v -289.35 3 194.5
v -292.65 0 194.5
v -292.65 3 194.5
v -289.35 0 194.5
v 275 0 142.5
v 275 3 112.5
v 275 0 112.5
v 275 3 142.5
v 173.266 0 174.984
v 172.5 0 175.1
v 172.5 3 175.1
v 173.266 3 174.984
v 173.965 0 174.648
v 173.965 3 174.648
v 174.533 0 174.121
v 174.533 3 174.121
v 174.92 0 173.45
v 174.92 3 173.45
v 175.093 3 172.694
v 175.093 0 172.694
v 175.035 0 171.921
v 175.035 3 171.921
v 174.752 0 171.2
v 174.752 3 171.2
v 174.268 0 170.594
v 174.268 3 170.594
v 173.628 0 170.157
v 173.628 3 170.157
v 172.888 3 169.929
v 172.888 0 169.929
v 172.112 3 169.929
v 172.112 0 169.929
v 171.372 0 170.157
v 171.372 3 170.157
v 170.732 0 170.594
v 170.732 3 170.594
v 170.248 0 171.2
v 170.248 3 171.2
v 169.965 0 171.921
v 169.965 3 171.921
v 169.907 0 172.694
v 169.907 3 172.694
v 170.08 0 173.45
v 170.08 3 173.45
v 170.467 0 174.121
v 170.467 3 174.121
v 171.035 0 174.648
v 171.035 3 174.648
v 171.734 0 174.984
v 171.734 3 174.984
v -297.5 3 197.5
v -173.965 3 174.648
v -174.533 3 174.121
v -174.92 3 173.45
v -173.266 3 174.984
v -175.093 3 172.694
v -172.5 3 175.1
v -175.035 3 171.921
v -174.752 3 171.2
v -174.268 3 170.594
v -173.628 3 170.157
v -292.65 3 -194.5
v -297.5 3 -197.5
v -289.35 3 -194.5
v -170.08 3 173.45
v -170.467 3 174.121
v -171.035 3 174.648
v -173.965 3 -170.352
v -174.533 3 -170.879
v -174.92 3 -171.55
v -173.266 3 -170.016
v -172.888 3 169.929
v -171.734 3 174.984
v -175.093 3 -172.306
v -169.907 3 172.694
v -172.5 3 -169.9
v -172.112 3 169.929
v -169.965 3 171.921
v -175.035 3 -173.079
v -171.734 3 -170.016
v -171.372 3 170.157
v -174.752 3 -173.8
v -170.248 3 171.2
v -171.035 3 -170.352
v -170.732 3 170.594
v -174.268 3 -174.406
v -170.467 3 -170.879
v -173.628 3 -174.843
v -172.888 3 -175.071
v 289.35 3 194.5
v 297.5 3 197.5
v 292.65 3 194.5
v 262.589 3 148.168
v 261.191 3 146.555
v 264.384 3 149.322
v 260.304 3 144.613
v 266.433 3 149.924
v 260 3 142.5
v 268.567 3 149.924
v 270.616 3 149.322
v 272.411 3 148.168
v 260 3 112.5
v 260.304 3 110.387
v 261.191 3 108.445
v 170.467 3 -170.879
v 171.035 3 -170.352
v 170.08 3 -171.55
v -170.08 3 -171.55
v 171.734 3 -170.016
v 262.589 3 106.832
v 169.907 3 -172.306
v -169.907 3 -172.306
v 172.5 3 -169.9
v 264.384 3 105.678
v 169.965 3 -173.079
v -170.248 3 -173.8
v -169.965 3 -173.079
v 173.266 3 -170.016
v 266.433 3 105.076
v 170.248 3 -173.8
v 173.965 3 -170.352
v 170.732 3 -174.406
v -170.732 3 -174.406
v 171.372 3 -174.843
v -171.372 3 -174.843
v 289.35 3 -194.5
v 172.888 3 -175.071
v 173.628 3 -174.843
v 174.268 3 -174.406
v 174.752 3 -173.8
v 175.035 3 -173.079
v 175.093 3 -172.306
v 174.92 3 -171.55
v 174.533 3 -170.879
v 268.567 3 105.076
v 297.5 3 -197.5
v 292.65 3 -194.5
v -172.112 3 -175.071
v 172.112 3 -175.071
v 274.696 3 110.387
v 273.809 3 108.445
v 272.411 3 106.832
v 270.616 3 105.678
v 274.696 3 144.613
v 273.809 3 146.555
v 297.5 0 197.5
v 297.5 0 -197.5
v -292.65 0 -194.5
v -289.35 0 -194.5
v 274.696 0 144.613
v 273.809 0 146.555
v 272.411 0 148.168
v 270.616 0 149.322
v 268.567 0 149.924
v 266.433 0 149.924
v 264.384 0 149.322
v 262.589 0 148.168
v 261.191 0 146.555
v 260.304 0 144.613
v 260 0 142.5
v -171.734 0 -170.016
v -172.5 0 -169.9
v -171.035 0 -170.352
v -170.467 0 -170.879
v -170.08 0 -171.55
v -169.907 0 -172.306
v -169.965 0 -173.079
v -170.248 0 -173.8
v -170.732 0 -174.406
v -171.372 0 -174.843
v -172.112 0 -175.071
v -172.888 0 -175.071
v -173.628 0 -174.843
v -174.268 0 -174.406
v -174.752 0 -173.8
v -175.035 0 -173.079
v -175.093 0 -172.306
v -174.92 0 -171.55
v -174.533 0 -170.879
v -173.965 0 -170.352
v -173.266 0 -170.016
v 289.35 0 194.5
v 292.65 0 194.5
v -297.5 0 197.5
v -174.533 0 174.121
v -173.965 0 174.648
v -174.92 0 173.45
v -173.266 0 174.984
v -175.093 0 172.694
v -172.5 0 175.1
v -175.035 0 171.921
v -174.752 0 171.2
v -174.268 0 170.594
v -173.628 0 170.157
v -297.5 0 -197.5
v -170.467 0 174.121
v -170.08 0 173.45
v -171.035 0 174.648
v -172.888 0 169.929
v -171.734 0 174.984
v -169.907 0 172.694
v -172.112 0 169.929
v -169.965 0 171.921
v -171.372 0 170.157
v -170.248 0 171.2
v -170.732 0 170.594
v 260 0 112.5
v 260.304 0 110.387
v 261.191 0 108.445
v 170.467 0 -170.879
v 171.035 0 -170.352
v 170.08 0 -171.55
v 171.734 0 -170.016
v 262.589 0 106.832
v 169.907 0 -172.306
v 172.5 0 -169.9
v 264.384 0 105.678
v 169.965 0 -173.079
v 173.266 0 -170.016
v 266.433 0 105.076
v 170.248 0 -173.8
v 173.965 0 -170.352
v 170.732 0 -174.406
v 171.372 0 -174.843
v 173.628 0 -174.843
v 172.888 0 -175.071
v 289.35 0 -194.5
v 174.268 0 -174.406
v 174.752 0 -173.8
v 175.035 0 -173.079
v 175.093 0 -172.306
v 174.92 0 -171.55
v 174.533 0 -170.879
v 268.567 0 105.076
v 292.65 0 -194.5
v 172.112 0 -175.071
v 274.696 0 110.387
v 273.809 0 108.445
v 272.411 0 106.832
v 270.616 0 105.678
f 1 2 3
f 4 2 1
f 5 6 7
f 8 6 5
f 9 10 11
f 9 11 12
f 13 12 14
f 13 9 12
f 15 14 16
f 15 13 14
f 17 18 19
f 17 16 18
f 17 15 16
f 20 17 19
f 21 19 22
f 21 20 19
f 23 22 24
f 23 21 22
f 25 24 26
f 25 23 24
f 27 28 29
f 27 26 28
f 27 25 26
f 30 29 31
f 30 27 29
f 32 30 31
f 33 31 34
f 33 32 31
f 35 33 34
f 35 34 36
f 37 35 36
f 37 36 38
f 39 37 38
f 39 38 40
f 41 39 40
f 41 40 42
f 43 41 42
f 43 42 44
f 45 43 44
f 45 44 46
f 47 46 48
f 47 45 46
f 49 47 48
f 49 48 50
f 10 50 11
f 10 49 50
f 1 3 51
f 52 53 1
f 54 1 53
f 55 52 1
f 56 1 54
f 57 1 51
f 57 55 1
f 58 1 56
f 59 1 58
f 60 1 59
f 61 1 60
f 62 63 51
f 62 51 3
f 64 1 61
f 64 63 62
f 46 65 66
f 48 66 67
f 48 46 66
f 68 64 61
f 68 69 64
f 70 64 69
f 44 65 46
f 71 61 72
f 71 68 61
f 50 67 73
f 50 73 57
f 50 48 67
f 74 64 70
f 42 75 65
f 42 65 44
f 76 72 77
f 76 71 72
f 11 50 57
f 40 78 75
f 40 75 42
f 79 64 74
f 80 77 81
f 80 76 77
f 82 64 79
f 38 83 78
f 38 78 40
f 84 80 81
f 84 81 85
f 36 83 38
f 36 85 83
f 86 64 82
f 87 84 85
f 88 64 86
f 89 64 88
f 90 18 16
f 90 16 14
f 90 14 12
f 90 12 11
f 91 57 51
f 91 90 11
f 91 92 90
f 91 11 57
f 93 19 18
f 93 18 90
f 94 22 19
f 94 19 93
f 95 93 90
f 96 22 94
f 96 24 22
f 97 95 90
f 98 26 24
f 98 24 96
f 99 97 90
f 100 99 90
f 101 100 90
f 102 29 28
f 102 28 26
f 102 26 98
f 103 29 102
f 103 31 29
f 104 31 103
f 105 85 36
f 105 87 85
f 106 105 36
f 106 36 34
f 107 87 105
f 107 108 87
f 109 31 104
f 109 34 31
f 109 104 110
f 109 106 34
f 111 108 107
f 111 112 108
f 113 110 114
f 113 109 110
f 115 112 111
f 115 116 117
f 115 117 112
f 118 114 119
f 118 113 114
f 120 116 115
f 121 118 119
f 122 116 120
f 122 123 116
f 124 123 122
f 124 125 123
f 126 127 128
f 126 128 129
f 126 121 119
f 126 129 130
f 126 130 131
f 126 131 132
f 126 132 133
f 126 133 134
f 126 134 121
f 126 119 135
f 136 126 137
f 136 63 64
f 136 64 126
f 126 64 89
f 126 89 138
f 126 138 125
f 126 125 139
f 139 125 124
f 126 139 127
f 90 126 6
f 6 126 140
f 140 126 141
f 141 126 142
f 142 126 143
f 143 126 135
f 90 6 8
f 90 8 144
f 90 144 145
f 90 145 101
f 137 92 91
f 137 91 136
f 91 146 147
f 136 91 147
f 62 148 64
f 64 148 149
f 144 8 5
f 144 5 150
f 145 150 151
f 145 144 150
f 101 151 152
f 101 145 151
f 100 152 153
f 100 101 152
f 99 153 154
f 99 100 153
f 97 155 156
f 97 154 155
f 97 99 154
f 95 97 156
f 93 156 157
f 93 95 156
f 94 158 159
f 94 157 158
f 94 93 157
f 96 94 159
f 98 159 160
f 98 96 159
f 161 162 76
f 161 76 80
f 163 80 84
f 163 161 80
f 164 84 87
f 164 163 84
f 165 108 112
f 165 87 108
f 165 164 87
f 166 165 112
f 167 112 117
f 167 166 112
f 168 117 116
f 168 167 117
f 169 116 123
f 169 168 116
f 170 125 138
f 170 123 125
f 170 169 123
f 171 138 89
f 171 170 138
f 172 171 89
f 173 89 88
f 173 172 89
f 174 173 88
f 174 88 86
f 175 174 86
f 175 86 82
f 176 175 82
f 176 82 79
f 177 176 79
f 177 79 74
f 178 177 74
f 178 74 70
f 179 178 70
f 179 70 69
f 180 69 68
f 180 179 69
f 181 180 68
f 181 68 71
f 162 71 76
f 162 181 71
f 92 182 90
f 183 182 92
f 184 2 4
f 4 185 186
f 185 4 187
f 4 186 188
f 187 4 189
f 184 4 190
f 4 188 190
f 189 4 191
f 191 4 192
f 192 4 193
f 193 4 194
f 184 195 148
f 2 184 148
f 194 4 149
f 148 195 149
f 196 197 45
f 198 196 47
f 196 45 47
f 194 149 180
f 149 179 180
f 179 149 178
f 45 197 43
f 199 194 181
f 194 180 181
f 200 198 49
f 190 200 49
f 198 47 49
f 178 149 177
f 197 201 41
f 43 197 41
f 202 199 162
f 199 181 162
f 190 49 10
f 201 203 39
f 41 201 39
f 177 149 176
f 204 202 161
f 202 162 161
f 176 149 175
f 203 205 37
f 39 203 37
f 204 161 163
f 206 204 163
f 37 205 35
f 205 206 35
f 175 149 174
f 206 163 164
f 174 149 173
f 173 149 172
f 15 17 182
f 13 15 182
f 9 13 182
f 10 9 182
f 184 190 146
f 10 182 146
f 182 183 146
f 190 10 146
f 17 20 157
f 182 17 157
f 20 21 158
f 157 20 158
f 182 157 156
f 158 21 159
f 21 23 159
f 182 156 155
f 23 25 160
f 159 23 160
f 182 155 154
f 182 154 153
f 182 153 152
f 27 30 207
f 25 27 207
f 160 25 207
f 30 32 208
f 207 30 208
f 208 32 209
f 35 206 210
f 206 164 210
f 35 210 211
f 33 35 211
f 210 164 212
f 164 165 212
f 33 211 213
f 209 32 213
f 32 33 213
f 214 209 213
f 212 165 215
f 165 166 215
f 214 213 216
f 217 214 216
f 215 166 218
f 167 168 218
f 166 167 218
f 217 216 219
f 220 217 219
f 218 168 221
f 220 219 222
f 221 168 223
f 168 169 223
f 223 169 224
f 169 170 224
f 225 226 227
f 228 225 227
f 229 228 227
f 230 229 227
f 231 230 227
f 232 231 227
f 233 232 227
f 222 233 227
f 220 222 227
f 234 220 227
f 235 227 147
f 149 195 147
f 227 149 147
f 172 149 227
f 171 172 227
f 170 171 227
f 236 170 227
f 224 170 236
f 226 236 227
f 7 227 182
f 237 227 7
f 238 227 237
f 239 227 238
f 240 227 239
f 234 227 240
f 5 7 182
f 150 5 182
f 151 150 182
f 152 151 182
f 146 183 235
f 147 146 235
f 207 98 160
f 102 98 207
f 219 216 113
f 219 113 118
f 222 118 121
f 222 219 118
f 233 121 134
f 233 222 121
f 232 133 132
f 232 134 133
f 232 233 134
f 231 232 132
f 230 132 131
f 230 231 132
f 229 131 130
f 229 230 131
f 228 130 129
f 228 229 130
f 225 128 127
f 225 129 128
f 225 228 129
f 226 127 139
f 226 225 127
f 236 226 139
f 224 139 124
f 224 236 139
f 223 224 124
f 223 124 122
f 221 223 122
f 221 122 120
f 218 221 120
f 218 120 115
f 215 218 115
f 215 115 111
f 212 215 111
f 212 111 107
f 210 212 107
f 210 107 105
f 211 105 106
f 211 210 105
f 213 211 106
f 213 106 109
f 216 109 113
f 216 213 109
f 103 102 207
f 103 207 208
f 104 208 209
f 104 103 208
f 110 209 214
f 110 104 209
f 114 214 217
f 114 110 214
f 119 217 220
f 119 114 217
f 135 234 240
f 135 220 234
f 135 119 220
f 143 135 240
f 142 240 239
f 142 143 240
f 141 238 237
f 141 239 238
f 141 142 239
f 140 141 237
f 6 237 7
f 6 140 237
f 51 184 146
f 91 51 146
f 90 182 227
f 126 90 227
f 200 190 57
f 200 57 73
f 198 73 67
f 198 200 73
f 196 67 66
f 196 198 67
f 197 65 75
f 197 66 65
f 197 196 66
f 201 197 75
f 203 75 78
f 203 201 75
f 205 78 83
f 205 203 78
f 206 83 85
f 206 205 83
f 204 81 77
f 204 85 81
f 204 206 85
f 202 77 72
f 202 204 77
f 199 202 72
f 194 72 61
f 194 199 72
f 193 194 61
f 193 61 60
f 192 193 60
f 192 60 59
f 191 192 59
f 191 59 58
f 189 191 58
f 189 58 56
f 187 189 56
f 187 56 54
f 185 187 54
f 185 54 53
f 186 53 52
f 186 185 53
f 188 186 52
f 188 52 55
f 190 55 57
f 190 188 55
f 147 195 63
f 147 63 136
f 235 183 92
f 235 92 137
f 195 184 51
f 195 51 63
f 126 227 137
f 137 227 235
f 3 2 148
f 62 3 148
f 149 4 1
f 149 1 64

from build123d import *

# Parameters (mm, degrees)
SKETCH1_W               = 595
SKETCH1_H               = 395
BOSS_EXTRUDE1_DEPTH     = 3
CUT_EXTRUDE1_DEPTH      = 10
CUT_EXTRUDE2_DEPTH      = 358.10152618
CUT_EXTRUDE2_DEPTH_BACK = 358.10152618
SKETCH5_W               = 3.3
SKETCH5_H               = 389
CUT_EXTRUDE3_DEPTH      = 358.10152618
CUT_EXTRUDE3_DEPTH_BACK = 358.10152618
SKETCH6_R               = 2.6


with BuildPart() as part:
    # Sketch1 → Boss-Extrude1 (new body)
    with BuildSketch(Plane(origin=(0, 0, 0), x_dir=(1, 0, 0), z_dir=(0, 1, 0))):
        Rectangle(SKETCH1_W, SKETCH1_H)
    extrude(amount=BOSS_EXTRUDE1_DEPTH)

    # Sketch2 → Cut-Extrude1 (cut)
    with BuildSketch(Plane(origin=(0, 3, 0), x_dir=(1, 0, 0), z_dir=(0, 1, 0))):
        with BuildLine():
            Line((275, -112.5), (275, -142.5))
            ThreePointArc((275, -142.5), (267.5, -150), (260, -142.5))
            Line((260, -142.5), (260, -112.5))
            ThreePointArc((260, -112.5), (267.5, -105), (275, -112.5))
        make_face()
    extrude(amount=-CUT_EXTRUDE1_DEPTH, mode=Mode.SUBTRACT)

    # Sketch5 → Cut-Extrude2 (cut, two sides: drawn at the far end of the back side and taken through both)
    with BuildSketch(Plane(origin=(0, 3, 0), x_dir=(1, 0, 0), z_dir=(0, 1, 0)).offset(-CUT_EXTRUDE2_DEPTH_BACK)):
        with Locations((-291, 0)):
            Rectangle(SKETCH5_W, SKETCH5_H)
        with Locations((291, 0)):
            Rectangle(SKETCH5_W, SKETCH5_H)
    extrude(amount=CUT_EXTRUDE2_DEPTH + CUT_EXTRUDE2_DEPTH_BACK, mode=Mode.SUBTRACT)

    # Sketch6 → Cut-Extrude3 (cut, two sides: drawn at the far end of the back side and taken through both)
    with BuildSketch(Plane(origin=(0, 3, 0), x_dir=(1, 0, 0), z_dir=(0, 1, 0)).offset(-CUT_EXTRUDE3_DEPTH_BACK)):
        with Locations(Location((172.5, 172.5, 0), (0, 0, 270))):
            Circle(SKETCH6_R)
        with Locations(Location((-172.5, -172.5, 0), (0, 0, 270))):
            Circle(SKETCH6_R)
        with Locations(Location((172.5, -172.5, 0), (0, 0, 270))):
            Circle(SKETCH6_R)
        with Locations(Location((-172.5, 172.5, 0), (0, 0, 270))):
            Circle(SKETCH6_R)
    extrude(amount=CUT_EXTRUDE3_DEPTH + CUT_EXTRUDE3_DEPTH_BACK, mode=Mode.SUBTRACT)


solid = part.part
